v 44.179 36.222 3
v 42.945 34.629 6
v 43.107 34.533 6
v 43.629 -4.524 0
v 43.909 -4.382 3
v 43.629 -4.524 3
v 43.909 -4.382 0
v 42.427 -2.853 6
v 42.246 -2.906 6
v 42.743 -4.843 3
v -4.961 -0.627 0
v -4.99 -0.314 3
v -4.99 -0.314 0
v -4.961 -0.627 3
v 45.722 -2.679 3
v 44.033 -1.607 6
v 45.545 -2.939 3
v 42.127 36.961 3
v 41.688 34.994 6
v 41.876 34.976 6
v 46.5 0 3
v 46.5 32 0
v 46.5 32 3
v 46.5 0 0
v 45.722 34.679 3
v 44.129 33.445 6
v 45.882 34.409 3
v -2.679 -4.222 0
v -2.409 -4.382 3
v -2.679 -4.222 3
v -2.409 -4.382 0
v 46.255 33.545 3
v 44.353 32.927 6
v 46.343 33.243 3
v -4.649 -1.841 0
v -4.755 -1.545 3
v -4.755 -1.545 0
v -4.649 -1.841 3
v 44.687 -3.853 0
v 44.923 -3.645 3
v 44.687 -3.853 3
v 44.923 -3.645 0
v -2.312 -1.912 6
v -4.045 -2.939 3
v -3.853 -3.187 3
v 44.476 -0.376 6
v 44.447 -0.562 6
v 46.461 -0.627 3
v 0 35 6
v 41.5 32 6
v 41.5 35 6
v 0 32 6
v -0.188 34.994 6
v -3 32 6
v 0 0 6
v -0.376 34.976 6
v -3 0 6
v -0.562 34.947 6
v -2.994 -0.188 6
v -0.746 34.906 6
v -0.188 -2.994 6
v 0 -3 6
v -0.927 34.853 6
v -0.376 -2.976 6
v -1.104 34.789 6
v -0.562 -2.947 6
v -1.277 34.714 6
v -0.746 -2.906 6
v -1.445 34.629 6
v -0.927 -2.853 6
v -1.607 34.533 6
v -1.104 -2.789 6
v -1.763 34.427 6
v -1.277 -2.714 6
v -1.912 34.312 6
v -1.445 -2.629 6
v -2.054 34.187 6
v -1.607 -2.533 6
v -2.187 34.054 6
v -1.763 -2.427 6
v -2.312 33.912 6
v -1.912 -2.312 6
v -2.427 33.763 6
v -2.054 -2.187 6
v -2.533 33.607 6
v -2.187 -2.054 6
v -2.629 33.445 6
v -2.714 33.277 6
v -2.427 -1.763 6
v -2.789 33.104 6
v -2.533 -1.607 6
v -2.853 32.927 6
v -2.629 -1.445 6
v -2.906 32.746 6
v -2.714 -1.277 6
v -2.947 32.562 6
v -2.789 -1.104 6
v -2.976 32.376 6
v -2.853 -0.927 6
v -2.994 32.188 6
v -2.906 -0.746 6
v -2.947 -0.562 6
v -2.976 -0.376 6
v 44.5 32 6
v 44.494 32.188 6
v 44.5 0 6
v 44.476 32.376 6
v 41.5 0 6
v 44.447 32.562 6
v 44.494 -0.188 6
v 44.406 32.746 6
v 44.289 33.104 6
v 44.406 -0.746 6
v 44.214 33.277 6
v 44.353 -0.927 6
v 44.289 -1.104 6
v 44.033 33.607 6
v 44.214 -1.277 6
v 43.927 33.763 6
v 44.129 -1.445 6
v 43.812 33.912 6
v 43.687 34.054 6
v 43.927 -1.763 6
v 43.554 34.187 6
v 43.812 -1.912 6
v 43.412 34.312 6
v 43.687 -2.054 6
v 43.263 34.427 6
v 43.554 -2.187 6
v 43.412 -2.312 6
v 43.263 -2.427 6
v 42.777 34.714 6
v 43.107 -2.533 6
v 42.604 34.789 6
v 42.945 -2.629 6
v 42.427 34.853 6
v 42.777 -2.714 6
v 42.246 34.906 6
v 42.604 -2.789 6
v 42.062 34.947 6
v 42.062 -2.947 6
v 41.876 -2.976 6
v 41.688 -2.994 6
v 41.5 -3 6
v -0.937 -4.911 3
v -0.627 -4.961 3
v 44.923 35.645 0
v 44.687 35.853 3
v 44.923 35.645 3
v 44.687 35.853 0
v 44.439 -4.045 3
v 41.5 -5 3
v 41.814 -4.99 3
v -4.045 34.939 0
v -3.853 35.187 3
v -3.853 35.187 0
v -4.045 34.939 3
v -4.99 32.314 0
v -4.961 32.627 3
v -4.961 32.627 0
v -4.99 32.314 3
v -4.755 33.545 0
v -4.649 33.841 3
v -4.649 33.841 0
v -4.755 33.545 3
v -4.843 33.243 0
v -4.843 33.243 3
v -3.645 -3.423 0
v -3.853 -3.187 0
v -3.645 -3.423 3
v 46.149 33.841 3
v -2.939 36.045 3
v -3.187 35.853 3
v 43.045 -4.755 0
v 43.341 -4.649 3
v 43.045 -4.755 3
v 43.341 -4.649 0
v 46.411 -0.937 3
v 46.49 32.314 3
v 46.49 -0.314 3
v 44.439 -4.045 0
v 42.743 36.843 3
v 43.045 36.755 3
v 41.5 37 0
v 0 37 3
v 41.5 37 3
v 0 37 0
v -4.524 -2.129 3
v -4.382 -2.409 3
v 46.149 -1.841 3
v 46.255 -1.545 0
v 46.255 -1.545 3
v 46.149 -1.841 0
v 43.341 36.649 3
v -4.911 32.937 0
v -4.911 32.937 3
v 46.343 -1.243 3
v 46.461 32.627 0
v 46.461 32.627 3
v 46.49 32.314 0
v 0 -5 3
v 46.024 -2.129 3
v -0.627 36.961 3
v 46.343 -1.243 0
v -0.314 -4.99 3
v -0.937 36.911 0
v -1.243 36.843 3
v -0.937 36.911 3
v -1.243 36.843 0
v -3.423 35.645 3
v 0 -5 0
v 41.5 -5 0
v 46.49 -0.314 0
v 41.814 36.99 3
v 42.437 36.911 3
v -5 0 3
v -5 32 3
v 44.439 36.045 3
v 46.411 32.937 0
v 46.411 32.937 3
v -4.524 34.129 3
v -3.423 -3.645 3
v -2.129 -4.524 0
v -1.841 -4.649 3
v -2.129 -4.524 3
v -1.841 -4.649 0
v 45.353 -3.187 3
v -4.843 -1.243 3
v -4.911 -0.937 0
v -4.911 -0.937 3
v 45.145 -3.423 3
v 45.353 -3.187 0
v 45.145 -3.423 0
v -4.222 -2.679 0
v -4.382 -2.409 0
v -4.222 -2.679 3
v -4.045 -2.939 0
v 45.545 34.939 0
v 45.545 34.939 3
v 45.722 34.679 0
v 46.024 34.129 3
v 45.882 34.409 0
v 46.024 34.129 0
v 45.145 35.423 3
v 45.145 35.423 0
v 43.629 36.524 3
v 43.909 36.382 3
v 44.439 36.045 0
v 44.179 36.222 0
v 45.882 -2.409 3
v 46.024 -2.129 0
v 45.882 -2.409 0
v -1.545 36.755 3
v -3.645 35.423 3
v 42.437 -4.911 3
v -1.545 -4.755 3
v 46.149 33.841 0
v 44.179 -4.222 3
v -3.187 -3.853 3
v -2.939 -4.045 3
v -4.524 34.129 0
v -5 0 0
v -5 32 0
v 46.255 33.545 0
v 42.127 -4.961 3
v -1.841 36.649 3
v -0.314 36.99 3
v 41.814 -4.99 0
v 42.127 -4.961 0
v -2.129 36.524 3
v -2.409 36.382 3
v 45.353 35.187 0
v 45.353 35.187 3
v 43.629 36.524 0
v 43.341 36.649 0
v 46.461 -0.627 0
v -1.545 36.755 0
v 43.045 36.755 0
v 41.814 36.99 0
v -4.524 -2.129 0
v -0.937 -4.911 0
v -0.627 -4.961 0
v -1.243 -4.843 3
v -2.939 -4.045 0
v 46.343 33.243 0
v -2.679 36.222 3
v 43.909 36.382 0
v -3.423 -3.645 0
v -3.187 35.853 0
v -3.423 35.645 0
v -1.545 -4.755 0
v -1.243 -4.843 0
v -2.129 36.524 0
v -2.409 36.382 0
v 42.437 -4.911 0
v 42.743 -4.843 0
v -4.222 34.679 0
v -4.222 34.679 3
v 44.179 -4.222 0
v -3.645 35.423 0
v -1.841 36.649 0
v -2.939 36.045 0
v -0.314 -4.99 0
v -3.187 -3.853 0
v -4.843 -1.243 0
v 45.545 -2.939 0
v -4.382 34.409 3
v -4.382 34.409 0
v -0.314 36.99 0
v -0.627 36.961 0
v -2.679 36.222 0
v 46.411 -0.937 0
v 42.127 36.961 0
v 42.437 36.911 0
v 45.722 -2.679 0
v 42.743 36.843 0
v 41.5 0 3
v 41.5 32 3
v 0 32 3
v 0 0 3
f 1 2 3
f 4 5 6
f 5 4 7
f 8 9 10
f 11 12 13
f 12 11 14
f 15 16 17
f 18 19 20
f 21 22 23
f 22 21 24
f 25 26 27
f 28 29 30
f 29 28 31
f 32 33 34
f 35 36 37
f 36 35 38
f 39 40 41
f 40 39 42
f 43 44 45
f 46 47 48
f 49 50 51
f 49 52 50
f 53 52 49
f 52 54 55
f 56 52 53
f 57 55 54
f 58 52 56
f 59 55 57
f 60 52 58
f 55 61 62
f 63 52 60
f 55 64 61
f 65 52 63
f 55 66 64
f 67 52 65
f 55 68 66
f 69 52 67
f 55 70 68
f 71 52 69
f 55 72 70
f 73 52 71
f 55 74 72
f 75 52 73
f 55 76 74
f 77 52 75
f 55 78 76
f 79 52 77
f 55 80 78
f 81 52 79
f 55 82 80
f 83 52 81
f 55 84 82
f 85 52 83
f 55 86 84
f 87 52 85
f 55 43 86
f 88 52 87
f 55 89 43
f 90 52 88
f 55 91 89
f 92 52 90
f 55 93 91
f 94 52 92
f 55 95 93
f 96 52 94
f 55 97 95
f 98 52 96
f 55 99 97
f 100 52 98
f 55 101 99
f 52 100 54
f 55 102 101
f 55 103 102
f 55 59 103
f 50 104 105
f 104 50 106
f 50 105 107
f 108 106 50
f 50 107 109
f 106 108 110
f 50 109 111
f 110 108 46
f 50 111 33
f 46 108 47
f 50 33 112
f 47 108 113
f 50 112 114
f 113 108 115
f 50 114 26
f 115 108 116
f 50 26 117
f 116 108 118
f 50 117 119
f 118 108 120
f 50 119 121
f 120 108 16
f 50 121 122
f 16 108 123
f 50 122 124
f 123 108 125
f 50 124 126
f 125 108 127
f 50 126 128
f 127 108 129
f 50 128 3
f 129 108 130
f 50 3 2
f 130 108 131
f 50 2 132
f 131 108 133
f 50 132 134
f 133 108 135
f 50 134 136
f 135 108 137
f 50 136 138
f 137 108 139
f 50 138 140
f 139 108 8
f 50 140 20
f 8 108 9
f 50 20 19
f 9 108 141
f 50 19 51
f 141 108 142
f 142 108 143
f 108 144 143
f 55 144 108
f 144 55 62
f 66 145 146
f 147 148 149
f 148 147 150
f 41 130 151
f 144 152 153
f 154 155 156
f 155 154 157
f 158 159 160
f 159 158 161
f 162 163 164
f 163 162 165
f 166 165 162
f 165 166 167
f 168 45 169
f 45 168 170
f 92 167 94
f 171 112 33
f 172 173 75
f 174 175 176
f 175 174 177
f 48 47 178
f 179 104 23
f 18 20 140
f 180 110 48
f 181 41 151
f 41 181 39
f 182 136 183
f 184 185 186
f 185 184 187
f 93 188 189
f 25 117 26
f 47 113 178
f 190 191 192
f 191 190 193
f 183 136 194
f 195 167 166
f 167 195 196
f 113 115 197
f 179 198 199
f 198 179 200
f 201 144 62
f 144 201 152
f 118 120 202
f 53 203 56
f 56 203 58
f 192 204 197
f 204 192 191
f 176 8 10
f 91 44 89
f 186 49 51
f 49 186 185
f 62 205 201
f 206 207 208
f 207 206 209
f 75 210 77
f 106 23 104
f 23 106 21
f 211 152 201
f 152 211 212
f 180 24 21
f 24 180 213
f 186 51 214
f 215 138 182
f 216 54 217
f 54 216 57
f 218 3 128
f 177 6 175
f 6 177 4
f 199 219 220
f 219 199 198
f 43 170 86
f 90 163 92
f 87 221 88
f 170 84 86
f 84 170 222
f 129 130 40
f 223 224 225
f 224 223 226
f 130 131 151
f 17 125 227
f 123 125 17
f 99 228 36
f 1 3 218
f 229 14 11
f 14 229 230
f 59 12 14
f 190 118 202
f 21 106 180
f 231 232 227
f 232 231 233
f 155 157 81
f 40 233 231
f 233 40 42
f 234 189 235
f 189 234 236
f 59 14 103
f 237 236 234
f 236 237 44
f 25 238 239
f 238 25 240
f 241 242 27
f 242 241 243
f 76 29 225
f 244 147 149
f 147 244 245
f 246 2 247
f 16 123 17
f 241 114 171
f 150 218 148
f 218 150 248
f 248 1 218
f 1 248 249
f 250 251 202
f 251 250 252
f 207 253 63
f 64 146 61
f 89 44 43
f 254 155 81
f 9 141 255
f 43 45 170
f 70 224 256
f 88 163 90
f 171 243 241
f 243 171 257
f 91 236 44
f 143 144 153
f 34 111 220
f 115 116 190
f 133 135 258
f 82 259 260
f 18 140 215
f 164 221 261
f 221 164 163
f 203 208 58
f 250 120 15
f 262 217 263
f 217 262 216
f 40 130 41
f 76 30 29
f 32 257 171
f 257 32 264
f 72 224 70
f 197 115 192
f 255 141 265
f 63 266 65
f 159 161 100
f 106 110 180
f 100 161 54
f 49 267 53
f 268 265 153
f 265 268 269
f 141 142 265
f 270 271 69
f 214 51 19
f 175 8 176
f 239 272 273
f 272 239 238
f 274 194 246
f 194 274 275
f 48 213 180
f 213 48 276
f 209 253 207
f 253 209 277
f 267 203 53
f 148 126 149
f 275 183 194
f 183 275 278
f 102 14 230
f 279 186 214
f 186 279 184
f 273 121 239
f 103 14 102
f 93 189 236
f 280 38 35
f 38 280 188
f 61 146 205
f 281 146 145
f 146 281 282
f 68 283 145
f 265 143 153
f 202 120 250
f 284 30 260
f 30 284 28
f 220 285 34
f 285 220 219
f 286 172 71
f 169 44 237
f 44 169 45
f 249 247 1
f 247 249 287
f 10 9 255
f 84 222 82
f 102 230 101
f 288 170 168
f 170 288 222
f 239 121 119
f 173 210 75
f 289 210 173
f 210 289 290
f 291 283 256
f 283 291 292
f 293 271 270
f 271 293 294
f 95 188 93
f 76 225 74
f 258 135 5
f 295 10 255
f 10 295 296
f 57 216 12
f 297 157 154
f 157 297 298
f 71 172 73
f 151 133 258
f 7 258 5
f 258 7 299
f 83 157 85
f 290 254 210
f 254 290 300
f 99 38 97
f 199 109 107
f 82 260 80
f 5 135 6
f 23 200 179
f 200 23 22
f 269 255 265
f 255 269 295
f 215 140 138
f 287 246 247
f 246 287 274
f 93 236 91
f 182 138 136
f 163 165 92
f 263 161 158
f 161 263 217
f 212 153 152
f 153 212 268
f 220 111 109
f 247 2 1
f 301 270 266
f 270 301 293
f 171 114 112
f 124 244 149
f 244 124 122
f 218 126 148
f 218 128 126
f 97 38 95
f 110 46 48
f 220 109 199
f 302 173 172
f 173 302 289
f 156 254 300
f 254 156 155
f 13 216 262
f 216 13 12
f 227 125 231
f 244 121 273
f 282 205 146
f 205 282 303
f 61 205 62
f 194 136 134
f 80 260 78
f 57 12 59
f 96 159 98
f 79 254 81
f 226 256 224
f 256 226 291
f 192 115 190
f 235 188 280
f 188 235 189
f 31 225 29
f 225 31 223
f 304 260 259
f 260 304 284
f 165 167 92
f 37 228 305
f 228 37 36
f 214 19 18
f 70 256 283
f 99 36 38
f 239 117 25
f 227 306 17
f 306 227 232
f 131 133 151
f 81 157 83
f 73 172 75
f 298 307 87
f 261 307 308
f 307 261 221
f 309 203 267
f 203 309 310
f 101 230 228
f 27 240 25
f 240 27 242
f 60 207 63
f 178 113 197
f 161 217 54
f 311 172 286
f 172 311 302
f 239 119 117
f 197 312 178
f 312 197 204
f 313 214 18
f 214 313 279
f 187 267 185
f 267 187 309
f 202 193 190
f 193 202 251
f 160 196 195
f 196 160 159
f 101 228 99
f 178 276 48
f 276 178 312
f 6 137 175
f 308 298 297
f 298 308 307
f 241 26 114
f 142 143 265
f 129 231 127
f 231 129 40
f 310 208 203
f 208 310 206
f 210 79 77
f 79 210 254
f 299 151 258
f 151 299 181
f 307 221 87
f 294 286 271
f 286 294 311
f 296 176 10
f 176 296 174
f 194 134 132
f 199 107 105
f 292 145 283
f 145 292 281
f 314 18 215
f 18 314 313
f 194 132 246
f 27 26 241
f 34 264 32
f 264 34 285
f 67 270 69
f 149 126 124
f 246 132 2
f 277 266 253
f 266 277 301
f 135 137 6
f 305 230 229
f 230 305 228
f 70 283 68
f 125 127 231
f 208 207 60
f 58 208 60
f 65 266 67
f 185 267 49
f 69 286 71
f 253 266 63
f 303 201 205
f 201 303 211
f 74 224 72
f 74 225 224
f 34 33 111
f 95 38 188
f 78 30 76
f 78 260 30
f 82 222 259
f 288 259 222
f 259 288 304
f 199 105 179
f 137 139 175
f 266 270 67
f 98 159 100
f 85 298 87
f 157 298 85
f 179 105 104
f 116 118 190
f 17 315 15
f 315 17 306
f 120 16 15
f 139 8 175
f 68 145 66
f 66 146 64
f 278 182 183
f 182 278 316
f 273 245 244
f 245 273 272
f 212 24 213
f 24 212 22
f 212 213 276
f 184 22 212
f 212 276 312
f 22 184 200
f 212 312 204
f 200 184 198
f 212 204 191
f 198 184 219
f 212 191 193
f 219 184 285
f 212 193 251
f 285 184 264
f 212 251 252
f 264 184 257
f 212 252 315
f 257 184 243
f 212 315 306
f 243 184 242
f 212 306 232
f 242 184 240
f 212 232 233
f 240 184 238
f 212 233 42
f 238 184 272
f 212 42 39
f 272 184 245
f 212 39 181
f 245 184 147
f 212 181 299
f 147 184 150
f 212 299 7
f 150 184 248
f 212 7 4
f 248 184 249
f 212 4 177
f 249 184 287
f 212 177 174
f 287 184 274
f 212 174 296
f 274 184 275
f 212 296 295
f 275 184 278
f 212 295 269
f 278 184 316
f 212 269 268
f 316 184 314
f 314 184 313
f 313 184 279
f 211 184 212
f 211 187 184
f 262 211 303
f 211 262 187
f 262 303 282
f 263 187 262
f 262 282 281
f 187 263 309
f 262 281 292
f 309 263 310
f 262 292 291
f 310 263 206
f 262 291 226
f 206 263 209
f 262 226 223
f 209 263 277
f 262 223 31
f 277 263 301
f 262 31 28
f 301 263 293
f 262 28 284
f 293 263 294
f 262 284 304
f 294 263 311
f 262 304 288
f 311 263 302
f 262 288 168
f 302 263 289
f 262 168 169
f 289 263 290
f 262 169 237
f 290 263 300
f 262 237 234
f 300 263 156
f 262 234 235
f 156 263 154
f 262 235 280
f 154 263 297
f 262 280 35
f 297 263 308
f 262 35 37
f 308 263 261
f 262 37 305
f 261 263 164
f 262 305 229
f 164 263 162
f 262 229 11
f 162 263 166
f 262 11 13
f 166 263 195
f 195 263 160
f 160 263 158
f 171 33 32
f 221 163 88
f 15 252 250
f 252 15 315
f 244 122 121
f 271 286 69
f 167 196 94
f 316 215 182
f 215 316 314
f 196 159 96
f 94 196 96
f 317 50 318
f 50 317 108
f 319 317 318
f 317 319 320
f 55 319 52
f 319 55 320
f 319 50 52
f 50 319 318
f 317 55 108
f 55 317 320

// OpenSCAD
$fn=100;

module front_pad1() {
x = 45;
y = 70;
h = 10;

xs = 38; 
ys = 32;


difference(){
    
hull(){
r = 2;
translate([r,r,0]) cylinder(r=r,h=h);
translate([x-r,r,0]) cylinder(r=r,h=h);
translate([r,y-r,0])cylinder(r=r,h=h);
translate([x-r,y-r,0])cylinder(r=r,h=h);
}


union (){
r1 = 3;
ofsx = 27;
ofsy= 17;


translate([(x-ofsx)/2,ofsy,-1]) {
    cylinder(r=r1, h=h+10);
    translate([ofsx,0,0]) cylinder(r=r1, h=h+10);
}


ofsx2 = 24;
ofsy2= 51;

translate([(x-ofsx2)/2,ofsy2,-1]) {
    cylinder(r=r1, h=h+10);
    translate([ofsx2,0,0]) cylinder(r=r1, h=h+10);
}
}
}

} 


module front_pad2() {

d1 = 61;
d2 = 49;

difference(){
cylinder(d=d1,h=3);
cylinder(d=d2,h=2);
}
}


module back_pad_v1(){


    // outer dim
    x0 = 41.5;
    y0 = 31;

    // inner dim
    x1 = 34;
    y1= 27;


    //base dim
    x = x0+8;
    y = y0+8;

    // hole dim 
    x2 = x1-10;
    y2 = y1-10;
    
    //height 
    h1 = 8;
    h2 = 3;

    difference(){
        union(){
            //%cube([x,y,5]);
            m1(x,y,h2);
            translate([(x-x1)/2,(y-y1)/2,0]) m1(x1,y1,h1);
        }
        translate([(x-x2)/2,(y-y2)/2,h2])  m1(x2,y2,h1-h2);
    }

    module m1(x,y,z) {
        d = 5;

        hull(){
            translate([d/2,d/2,0]) cylinder(d=d,h=z);
            translate([d/2,y-d/2,0]) cylinder(d=d,h=z);

            translate([x-d/2,d/2,0]) cylinder(d=d,h=z);
            translate([x-d/2,y-d/2,0]) cylinder(d=d,h=z);
        }
        
        
    }
}

module back_pad_v2(){
    
    x0 = 40.5 + 1;
    y0 = 31 + 1;
    offs = 5;
    h = 3;
    
    difference(){
    hull(){
        hull(){
        translate([0,0,0]) cylinder(r=offs, h = h); 
        translate([x0,0,0]) cylinder(r=offs, h = h); 
        translate([0,y0,0]) cylinder(r=offs, h = h); 
        translate([x0,y0,0]) cylinder(r=offs, h = h); 
        }
        
        hull(){
        h2 = 2*h;
        r2 = 3;
        translate([0,0,0]) cylinder(r=r2, h = h2); 
        translate([x0,0,0]) cylinder(r=r2, h = h2); 
        translate([0,y0,0]) cylinder(r=r2, h = h2); 
        translate([x0,y0,0]) cylinder(r=r2, h = h2); 
        }
    }
    
    translate([0,0,h]) cube([x0,y0,h]);
   }
    
}

back_pad_v2();
//front_pad1();

//front_pad2();
